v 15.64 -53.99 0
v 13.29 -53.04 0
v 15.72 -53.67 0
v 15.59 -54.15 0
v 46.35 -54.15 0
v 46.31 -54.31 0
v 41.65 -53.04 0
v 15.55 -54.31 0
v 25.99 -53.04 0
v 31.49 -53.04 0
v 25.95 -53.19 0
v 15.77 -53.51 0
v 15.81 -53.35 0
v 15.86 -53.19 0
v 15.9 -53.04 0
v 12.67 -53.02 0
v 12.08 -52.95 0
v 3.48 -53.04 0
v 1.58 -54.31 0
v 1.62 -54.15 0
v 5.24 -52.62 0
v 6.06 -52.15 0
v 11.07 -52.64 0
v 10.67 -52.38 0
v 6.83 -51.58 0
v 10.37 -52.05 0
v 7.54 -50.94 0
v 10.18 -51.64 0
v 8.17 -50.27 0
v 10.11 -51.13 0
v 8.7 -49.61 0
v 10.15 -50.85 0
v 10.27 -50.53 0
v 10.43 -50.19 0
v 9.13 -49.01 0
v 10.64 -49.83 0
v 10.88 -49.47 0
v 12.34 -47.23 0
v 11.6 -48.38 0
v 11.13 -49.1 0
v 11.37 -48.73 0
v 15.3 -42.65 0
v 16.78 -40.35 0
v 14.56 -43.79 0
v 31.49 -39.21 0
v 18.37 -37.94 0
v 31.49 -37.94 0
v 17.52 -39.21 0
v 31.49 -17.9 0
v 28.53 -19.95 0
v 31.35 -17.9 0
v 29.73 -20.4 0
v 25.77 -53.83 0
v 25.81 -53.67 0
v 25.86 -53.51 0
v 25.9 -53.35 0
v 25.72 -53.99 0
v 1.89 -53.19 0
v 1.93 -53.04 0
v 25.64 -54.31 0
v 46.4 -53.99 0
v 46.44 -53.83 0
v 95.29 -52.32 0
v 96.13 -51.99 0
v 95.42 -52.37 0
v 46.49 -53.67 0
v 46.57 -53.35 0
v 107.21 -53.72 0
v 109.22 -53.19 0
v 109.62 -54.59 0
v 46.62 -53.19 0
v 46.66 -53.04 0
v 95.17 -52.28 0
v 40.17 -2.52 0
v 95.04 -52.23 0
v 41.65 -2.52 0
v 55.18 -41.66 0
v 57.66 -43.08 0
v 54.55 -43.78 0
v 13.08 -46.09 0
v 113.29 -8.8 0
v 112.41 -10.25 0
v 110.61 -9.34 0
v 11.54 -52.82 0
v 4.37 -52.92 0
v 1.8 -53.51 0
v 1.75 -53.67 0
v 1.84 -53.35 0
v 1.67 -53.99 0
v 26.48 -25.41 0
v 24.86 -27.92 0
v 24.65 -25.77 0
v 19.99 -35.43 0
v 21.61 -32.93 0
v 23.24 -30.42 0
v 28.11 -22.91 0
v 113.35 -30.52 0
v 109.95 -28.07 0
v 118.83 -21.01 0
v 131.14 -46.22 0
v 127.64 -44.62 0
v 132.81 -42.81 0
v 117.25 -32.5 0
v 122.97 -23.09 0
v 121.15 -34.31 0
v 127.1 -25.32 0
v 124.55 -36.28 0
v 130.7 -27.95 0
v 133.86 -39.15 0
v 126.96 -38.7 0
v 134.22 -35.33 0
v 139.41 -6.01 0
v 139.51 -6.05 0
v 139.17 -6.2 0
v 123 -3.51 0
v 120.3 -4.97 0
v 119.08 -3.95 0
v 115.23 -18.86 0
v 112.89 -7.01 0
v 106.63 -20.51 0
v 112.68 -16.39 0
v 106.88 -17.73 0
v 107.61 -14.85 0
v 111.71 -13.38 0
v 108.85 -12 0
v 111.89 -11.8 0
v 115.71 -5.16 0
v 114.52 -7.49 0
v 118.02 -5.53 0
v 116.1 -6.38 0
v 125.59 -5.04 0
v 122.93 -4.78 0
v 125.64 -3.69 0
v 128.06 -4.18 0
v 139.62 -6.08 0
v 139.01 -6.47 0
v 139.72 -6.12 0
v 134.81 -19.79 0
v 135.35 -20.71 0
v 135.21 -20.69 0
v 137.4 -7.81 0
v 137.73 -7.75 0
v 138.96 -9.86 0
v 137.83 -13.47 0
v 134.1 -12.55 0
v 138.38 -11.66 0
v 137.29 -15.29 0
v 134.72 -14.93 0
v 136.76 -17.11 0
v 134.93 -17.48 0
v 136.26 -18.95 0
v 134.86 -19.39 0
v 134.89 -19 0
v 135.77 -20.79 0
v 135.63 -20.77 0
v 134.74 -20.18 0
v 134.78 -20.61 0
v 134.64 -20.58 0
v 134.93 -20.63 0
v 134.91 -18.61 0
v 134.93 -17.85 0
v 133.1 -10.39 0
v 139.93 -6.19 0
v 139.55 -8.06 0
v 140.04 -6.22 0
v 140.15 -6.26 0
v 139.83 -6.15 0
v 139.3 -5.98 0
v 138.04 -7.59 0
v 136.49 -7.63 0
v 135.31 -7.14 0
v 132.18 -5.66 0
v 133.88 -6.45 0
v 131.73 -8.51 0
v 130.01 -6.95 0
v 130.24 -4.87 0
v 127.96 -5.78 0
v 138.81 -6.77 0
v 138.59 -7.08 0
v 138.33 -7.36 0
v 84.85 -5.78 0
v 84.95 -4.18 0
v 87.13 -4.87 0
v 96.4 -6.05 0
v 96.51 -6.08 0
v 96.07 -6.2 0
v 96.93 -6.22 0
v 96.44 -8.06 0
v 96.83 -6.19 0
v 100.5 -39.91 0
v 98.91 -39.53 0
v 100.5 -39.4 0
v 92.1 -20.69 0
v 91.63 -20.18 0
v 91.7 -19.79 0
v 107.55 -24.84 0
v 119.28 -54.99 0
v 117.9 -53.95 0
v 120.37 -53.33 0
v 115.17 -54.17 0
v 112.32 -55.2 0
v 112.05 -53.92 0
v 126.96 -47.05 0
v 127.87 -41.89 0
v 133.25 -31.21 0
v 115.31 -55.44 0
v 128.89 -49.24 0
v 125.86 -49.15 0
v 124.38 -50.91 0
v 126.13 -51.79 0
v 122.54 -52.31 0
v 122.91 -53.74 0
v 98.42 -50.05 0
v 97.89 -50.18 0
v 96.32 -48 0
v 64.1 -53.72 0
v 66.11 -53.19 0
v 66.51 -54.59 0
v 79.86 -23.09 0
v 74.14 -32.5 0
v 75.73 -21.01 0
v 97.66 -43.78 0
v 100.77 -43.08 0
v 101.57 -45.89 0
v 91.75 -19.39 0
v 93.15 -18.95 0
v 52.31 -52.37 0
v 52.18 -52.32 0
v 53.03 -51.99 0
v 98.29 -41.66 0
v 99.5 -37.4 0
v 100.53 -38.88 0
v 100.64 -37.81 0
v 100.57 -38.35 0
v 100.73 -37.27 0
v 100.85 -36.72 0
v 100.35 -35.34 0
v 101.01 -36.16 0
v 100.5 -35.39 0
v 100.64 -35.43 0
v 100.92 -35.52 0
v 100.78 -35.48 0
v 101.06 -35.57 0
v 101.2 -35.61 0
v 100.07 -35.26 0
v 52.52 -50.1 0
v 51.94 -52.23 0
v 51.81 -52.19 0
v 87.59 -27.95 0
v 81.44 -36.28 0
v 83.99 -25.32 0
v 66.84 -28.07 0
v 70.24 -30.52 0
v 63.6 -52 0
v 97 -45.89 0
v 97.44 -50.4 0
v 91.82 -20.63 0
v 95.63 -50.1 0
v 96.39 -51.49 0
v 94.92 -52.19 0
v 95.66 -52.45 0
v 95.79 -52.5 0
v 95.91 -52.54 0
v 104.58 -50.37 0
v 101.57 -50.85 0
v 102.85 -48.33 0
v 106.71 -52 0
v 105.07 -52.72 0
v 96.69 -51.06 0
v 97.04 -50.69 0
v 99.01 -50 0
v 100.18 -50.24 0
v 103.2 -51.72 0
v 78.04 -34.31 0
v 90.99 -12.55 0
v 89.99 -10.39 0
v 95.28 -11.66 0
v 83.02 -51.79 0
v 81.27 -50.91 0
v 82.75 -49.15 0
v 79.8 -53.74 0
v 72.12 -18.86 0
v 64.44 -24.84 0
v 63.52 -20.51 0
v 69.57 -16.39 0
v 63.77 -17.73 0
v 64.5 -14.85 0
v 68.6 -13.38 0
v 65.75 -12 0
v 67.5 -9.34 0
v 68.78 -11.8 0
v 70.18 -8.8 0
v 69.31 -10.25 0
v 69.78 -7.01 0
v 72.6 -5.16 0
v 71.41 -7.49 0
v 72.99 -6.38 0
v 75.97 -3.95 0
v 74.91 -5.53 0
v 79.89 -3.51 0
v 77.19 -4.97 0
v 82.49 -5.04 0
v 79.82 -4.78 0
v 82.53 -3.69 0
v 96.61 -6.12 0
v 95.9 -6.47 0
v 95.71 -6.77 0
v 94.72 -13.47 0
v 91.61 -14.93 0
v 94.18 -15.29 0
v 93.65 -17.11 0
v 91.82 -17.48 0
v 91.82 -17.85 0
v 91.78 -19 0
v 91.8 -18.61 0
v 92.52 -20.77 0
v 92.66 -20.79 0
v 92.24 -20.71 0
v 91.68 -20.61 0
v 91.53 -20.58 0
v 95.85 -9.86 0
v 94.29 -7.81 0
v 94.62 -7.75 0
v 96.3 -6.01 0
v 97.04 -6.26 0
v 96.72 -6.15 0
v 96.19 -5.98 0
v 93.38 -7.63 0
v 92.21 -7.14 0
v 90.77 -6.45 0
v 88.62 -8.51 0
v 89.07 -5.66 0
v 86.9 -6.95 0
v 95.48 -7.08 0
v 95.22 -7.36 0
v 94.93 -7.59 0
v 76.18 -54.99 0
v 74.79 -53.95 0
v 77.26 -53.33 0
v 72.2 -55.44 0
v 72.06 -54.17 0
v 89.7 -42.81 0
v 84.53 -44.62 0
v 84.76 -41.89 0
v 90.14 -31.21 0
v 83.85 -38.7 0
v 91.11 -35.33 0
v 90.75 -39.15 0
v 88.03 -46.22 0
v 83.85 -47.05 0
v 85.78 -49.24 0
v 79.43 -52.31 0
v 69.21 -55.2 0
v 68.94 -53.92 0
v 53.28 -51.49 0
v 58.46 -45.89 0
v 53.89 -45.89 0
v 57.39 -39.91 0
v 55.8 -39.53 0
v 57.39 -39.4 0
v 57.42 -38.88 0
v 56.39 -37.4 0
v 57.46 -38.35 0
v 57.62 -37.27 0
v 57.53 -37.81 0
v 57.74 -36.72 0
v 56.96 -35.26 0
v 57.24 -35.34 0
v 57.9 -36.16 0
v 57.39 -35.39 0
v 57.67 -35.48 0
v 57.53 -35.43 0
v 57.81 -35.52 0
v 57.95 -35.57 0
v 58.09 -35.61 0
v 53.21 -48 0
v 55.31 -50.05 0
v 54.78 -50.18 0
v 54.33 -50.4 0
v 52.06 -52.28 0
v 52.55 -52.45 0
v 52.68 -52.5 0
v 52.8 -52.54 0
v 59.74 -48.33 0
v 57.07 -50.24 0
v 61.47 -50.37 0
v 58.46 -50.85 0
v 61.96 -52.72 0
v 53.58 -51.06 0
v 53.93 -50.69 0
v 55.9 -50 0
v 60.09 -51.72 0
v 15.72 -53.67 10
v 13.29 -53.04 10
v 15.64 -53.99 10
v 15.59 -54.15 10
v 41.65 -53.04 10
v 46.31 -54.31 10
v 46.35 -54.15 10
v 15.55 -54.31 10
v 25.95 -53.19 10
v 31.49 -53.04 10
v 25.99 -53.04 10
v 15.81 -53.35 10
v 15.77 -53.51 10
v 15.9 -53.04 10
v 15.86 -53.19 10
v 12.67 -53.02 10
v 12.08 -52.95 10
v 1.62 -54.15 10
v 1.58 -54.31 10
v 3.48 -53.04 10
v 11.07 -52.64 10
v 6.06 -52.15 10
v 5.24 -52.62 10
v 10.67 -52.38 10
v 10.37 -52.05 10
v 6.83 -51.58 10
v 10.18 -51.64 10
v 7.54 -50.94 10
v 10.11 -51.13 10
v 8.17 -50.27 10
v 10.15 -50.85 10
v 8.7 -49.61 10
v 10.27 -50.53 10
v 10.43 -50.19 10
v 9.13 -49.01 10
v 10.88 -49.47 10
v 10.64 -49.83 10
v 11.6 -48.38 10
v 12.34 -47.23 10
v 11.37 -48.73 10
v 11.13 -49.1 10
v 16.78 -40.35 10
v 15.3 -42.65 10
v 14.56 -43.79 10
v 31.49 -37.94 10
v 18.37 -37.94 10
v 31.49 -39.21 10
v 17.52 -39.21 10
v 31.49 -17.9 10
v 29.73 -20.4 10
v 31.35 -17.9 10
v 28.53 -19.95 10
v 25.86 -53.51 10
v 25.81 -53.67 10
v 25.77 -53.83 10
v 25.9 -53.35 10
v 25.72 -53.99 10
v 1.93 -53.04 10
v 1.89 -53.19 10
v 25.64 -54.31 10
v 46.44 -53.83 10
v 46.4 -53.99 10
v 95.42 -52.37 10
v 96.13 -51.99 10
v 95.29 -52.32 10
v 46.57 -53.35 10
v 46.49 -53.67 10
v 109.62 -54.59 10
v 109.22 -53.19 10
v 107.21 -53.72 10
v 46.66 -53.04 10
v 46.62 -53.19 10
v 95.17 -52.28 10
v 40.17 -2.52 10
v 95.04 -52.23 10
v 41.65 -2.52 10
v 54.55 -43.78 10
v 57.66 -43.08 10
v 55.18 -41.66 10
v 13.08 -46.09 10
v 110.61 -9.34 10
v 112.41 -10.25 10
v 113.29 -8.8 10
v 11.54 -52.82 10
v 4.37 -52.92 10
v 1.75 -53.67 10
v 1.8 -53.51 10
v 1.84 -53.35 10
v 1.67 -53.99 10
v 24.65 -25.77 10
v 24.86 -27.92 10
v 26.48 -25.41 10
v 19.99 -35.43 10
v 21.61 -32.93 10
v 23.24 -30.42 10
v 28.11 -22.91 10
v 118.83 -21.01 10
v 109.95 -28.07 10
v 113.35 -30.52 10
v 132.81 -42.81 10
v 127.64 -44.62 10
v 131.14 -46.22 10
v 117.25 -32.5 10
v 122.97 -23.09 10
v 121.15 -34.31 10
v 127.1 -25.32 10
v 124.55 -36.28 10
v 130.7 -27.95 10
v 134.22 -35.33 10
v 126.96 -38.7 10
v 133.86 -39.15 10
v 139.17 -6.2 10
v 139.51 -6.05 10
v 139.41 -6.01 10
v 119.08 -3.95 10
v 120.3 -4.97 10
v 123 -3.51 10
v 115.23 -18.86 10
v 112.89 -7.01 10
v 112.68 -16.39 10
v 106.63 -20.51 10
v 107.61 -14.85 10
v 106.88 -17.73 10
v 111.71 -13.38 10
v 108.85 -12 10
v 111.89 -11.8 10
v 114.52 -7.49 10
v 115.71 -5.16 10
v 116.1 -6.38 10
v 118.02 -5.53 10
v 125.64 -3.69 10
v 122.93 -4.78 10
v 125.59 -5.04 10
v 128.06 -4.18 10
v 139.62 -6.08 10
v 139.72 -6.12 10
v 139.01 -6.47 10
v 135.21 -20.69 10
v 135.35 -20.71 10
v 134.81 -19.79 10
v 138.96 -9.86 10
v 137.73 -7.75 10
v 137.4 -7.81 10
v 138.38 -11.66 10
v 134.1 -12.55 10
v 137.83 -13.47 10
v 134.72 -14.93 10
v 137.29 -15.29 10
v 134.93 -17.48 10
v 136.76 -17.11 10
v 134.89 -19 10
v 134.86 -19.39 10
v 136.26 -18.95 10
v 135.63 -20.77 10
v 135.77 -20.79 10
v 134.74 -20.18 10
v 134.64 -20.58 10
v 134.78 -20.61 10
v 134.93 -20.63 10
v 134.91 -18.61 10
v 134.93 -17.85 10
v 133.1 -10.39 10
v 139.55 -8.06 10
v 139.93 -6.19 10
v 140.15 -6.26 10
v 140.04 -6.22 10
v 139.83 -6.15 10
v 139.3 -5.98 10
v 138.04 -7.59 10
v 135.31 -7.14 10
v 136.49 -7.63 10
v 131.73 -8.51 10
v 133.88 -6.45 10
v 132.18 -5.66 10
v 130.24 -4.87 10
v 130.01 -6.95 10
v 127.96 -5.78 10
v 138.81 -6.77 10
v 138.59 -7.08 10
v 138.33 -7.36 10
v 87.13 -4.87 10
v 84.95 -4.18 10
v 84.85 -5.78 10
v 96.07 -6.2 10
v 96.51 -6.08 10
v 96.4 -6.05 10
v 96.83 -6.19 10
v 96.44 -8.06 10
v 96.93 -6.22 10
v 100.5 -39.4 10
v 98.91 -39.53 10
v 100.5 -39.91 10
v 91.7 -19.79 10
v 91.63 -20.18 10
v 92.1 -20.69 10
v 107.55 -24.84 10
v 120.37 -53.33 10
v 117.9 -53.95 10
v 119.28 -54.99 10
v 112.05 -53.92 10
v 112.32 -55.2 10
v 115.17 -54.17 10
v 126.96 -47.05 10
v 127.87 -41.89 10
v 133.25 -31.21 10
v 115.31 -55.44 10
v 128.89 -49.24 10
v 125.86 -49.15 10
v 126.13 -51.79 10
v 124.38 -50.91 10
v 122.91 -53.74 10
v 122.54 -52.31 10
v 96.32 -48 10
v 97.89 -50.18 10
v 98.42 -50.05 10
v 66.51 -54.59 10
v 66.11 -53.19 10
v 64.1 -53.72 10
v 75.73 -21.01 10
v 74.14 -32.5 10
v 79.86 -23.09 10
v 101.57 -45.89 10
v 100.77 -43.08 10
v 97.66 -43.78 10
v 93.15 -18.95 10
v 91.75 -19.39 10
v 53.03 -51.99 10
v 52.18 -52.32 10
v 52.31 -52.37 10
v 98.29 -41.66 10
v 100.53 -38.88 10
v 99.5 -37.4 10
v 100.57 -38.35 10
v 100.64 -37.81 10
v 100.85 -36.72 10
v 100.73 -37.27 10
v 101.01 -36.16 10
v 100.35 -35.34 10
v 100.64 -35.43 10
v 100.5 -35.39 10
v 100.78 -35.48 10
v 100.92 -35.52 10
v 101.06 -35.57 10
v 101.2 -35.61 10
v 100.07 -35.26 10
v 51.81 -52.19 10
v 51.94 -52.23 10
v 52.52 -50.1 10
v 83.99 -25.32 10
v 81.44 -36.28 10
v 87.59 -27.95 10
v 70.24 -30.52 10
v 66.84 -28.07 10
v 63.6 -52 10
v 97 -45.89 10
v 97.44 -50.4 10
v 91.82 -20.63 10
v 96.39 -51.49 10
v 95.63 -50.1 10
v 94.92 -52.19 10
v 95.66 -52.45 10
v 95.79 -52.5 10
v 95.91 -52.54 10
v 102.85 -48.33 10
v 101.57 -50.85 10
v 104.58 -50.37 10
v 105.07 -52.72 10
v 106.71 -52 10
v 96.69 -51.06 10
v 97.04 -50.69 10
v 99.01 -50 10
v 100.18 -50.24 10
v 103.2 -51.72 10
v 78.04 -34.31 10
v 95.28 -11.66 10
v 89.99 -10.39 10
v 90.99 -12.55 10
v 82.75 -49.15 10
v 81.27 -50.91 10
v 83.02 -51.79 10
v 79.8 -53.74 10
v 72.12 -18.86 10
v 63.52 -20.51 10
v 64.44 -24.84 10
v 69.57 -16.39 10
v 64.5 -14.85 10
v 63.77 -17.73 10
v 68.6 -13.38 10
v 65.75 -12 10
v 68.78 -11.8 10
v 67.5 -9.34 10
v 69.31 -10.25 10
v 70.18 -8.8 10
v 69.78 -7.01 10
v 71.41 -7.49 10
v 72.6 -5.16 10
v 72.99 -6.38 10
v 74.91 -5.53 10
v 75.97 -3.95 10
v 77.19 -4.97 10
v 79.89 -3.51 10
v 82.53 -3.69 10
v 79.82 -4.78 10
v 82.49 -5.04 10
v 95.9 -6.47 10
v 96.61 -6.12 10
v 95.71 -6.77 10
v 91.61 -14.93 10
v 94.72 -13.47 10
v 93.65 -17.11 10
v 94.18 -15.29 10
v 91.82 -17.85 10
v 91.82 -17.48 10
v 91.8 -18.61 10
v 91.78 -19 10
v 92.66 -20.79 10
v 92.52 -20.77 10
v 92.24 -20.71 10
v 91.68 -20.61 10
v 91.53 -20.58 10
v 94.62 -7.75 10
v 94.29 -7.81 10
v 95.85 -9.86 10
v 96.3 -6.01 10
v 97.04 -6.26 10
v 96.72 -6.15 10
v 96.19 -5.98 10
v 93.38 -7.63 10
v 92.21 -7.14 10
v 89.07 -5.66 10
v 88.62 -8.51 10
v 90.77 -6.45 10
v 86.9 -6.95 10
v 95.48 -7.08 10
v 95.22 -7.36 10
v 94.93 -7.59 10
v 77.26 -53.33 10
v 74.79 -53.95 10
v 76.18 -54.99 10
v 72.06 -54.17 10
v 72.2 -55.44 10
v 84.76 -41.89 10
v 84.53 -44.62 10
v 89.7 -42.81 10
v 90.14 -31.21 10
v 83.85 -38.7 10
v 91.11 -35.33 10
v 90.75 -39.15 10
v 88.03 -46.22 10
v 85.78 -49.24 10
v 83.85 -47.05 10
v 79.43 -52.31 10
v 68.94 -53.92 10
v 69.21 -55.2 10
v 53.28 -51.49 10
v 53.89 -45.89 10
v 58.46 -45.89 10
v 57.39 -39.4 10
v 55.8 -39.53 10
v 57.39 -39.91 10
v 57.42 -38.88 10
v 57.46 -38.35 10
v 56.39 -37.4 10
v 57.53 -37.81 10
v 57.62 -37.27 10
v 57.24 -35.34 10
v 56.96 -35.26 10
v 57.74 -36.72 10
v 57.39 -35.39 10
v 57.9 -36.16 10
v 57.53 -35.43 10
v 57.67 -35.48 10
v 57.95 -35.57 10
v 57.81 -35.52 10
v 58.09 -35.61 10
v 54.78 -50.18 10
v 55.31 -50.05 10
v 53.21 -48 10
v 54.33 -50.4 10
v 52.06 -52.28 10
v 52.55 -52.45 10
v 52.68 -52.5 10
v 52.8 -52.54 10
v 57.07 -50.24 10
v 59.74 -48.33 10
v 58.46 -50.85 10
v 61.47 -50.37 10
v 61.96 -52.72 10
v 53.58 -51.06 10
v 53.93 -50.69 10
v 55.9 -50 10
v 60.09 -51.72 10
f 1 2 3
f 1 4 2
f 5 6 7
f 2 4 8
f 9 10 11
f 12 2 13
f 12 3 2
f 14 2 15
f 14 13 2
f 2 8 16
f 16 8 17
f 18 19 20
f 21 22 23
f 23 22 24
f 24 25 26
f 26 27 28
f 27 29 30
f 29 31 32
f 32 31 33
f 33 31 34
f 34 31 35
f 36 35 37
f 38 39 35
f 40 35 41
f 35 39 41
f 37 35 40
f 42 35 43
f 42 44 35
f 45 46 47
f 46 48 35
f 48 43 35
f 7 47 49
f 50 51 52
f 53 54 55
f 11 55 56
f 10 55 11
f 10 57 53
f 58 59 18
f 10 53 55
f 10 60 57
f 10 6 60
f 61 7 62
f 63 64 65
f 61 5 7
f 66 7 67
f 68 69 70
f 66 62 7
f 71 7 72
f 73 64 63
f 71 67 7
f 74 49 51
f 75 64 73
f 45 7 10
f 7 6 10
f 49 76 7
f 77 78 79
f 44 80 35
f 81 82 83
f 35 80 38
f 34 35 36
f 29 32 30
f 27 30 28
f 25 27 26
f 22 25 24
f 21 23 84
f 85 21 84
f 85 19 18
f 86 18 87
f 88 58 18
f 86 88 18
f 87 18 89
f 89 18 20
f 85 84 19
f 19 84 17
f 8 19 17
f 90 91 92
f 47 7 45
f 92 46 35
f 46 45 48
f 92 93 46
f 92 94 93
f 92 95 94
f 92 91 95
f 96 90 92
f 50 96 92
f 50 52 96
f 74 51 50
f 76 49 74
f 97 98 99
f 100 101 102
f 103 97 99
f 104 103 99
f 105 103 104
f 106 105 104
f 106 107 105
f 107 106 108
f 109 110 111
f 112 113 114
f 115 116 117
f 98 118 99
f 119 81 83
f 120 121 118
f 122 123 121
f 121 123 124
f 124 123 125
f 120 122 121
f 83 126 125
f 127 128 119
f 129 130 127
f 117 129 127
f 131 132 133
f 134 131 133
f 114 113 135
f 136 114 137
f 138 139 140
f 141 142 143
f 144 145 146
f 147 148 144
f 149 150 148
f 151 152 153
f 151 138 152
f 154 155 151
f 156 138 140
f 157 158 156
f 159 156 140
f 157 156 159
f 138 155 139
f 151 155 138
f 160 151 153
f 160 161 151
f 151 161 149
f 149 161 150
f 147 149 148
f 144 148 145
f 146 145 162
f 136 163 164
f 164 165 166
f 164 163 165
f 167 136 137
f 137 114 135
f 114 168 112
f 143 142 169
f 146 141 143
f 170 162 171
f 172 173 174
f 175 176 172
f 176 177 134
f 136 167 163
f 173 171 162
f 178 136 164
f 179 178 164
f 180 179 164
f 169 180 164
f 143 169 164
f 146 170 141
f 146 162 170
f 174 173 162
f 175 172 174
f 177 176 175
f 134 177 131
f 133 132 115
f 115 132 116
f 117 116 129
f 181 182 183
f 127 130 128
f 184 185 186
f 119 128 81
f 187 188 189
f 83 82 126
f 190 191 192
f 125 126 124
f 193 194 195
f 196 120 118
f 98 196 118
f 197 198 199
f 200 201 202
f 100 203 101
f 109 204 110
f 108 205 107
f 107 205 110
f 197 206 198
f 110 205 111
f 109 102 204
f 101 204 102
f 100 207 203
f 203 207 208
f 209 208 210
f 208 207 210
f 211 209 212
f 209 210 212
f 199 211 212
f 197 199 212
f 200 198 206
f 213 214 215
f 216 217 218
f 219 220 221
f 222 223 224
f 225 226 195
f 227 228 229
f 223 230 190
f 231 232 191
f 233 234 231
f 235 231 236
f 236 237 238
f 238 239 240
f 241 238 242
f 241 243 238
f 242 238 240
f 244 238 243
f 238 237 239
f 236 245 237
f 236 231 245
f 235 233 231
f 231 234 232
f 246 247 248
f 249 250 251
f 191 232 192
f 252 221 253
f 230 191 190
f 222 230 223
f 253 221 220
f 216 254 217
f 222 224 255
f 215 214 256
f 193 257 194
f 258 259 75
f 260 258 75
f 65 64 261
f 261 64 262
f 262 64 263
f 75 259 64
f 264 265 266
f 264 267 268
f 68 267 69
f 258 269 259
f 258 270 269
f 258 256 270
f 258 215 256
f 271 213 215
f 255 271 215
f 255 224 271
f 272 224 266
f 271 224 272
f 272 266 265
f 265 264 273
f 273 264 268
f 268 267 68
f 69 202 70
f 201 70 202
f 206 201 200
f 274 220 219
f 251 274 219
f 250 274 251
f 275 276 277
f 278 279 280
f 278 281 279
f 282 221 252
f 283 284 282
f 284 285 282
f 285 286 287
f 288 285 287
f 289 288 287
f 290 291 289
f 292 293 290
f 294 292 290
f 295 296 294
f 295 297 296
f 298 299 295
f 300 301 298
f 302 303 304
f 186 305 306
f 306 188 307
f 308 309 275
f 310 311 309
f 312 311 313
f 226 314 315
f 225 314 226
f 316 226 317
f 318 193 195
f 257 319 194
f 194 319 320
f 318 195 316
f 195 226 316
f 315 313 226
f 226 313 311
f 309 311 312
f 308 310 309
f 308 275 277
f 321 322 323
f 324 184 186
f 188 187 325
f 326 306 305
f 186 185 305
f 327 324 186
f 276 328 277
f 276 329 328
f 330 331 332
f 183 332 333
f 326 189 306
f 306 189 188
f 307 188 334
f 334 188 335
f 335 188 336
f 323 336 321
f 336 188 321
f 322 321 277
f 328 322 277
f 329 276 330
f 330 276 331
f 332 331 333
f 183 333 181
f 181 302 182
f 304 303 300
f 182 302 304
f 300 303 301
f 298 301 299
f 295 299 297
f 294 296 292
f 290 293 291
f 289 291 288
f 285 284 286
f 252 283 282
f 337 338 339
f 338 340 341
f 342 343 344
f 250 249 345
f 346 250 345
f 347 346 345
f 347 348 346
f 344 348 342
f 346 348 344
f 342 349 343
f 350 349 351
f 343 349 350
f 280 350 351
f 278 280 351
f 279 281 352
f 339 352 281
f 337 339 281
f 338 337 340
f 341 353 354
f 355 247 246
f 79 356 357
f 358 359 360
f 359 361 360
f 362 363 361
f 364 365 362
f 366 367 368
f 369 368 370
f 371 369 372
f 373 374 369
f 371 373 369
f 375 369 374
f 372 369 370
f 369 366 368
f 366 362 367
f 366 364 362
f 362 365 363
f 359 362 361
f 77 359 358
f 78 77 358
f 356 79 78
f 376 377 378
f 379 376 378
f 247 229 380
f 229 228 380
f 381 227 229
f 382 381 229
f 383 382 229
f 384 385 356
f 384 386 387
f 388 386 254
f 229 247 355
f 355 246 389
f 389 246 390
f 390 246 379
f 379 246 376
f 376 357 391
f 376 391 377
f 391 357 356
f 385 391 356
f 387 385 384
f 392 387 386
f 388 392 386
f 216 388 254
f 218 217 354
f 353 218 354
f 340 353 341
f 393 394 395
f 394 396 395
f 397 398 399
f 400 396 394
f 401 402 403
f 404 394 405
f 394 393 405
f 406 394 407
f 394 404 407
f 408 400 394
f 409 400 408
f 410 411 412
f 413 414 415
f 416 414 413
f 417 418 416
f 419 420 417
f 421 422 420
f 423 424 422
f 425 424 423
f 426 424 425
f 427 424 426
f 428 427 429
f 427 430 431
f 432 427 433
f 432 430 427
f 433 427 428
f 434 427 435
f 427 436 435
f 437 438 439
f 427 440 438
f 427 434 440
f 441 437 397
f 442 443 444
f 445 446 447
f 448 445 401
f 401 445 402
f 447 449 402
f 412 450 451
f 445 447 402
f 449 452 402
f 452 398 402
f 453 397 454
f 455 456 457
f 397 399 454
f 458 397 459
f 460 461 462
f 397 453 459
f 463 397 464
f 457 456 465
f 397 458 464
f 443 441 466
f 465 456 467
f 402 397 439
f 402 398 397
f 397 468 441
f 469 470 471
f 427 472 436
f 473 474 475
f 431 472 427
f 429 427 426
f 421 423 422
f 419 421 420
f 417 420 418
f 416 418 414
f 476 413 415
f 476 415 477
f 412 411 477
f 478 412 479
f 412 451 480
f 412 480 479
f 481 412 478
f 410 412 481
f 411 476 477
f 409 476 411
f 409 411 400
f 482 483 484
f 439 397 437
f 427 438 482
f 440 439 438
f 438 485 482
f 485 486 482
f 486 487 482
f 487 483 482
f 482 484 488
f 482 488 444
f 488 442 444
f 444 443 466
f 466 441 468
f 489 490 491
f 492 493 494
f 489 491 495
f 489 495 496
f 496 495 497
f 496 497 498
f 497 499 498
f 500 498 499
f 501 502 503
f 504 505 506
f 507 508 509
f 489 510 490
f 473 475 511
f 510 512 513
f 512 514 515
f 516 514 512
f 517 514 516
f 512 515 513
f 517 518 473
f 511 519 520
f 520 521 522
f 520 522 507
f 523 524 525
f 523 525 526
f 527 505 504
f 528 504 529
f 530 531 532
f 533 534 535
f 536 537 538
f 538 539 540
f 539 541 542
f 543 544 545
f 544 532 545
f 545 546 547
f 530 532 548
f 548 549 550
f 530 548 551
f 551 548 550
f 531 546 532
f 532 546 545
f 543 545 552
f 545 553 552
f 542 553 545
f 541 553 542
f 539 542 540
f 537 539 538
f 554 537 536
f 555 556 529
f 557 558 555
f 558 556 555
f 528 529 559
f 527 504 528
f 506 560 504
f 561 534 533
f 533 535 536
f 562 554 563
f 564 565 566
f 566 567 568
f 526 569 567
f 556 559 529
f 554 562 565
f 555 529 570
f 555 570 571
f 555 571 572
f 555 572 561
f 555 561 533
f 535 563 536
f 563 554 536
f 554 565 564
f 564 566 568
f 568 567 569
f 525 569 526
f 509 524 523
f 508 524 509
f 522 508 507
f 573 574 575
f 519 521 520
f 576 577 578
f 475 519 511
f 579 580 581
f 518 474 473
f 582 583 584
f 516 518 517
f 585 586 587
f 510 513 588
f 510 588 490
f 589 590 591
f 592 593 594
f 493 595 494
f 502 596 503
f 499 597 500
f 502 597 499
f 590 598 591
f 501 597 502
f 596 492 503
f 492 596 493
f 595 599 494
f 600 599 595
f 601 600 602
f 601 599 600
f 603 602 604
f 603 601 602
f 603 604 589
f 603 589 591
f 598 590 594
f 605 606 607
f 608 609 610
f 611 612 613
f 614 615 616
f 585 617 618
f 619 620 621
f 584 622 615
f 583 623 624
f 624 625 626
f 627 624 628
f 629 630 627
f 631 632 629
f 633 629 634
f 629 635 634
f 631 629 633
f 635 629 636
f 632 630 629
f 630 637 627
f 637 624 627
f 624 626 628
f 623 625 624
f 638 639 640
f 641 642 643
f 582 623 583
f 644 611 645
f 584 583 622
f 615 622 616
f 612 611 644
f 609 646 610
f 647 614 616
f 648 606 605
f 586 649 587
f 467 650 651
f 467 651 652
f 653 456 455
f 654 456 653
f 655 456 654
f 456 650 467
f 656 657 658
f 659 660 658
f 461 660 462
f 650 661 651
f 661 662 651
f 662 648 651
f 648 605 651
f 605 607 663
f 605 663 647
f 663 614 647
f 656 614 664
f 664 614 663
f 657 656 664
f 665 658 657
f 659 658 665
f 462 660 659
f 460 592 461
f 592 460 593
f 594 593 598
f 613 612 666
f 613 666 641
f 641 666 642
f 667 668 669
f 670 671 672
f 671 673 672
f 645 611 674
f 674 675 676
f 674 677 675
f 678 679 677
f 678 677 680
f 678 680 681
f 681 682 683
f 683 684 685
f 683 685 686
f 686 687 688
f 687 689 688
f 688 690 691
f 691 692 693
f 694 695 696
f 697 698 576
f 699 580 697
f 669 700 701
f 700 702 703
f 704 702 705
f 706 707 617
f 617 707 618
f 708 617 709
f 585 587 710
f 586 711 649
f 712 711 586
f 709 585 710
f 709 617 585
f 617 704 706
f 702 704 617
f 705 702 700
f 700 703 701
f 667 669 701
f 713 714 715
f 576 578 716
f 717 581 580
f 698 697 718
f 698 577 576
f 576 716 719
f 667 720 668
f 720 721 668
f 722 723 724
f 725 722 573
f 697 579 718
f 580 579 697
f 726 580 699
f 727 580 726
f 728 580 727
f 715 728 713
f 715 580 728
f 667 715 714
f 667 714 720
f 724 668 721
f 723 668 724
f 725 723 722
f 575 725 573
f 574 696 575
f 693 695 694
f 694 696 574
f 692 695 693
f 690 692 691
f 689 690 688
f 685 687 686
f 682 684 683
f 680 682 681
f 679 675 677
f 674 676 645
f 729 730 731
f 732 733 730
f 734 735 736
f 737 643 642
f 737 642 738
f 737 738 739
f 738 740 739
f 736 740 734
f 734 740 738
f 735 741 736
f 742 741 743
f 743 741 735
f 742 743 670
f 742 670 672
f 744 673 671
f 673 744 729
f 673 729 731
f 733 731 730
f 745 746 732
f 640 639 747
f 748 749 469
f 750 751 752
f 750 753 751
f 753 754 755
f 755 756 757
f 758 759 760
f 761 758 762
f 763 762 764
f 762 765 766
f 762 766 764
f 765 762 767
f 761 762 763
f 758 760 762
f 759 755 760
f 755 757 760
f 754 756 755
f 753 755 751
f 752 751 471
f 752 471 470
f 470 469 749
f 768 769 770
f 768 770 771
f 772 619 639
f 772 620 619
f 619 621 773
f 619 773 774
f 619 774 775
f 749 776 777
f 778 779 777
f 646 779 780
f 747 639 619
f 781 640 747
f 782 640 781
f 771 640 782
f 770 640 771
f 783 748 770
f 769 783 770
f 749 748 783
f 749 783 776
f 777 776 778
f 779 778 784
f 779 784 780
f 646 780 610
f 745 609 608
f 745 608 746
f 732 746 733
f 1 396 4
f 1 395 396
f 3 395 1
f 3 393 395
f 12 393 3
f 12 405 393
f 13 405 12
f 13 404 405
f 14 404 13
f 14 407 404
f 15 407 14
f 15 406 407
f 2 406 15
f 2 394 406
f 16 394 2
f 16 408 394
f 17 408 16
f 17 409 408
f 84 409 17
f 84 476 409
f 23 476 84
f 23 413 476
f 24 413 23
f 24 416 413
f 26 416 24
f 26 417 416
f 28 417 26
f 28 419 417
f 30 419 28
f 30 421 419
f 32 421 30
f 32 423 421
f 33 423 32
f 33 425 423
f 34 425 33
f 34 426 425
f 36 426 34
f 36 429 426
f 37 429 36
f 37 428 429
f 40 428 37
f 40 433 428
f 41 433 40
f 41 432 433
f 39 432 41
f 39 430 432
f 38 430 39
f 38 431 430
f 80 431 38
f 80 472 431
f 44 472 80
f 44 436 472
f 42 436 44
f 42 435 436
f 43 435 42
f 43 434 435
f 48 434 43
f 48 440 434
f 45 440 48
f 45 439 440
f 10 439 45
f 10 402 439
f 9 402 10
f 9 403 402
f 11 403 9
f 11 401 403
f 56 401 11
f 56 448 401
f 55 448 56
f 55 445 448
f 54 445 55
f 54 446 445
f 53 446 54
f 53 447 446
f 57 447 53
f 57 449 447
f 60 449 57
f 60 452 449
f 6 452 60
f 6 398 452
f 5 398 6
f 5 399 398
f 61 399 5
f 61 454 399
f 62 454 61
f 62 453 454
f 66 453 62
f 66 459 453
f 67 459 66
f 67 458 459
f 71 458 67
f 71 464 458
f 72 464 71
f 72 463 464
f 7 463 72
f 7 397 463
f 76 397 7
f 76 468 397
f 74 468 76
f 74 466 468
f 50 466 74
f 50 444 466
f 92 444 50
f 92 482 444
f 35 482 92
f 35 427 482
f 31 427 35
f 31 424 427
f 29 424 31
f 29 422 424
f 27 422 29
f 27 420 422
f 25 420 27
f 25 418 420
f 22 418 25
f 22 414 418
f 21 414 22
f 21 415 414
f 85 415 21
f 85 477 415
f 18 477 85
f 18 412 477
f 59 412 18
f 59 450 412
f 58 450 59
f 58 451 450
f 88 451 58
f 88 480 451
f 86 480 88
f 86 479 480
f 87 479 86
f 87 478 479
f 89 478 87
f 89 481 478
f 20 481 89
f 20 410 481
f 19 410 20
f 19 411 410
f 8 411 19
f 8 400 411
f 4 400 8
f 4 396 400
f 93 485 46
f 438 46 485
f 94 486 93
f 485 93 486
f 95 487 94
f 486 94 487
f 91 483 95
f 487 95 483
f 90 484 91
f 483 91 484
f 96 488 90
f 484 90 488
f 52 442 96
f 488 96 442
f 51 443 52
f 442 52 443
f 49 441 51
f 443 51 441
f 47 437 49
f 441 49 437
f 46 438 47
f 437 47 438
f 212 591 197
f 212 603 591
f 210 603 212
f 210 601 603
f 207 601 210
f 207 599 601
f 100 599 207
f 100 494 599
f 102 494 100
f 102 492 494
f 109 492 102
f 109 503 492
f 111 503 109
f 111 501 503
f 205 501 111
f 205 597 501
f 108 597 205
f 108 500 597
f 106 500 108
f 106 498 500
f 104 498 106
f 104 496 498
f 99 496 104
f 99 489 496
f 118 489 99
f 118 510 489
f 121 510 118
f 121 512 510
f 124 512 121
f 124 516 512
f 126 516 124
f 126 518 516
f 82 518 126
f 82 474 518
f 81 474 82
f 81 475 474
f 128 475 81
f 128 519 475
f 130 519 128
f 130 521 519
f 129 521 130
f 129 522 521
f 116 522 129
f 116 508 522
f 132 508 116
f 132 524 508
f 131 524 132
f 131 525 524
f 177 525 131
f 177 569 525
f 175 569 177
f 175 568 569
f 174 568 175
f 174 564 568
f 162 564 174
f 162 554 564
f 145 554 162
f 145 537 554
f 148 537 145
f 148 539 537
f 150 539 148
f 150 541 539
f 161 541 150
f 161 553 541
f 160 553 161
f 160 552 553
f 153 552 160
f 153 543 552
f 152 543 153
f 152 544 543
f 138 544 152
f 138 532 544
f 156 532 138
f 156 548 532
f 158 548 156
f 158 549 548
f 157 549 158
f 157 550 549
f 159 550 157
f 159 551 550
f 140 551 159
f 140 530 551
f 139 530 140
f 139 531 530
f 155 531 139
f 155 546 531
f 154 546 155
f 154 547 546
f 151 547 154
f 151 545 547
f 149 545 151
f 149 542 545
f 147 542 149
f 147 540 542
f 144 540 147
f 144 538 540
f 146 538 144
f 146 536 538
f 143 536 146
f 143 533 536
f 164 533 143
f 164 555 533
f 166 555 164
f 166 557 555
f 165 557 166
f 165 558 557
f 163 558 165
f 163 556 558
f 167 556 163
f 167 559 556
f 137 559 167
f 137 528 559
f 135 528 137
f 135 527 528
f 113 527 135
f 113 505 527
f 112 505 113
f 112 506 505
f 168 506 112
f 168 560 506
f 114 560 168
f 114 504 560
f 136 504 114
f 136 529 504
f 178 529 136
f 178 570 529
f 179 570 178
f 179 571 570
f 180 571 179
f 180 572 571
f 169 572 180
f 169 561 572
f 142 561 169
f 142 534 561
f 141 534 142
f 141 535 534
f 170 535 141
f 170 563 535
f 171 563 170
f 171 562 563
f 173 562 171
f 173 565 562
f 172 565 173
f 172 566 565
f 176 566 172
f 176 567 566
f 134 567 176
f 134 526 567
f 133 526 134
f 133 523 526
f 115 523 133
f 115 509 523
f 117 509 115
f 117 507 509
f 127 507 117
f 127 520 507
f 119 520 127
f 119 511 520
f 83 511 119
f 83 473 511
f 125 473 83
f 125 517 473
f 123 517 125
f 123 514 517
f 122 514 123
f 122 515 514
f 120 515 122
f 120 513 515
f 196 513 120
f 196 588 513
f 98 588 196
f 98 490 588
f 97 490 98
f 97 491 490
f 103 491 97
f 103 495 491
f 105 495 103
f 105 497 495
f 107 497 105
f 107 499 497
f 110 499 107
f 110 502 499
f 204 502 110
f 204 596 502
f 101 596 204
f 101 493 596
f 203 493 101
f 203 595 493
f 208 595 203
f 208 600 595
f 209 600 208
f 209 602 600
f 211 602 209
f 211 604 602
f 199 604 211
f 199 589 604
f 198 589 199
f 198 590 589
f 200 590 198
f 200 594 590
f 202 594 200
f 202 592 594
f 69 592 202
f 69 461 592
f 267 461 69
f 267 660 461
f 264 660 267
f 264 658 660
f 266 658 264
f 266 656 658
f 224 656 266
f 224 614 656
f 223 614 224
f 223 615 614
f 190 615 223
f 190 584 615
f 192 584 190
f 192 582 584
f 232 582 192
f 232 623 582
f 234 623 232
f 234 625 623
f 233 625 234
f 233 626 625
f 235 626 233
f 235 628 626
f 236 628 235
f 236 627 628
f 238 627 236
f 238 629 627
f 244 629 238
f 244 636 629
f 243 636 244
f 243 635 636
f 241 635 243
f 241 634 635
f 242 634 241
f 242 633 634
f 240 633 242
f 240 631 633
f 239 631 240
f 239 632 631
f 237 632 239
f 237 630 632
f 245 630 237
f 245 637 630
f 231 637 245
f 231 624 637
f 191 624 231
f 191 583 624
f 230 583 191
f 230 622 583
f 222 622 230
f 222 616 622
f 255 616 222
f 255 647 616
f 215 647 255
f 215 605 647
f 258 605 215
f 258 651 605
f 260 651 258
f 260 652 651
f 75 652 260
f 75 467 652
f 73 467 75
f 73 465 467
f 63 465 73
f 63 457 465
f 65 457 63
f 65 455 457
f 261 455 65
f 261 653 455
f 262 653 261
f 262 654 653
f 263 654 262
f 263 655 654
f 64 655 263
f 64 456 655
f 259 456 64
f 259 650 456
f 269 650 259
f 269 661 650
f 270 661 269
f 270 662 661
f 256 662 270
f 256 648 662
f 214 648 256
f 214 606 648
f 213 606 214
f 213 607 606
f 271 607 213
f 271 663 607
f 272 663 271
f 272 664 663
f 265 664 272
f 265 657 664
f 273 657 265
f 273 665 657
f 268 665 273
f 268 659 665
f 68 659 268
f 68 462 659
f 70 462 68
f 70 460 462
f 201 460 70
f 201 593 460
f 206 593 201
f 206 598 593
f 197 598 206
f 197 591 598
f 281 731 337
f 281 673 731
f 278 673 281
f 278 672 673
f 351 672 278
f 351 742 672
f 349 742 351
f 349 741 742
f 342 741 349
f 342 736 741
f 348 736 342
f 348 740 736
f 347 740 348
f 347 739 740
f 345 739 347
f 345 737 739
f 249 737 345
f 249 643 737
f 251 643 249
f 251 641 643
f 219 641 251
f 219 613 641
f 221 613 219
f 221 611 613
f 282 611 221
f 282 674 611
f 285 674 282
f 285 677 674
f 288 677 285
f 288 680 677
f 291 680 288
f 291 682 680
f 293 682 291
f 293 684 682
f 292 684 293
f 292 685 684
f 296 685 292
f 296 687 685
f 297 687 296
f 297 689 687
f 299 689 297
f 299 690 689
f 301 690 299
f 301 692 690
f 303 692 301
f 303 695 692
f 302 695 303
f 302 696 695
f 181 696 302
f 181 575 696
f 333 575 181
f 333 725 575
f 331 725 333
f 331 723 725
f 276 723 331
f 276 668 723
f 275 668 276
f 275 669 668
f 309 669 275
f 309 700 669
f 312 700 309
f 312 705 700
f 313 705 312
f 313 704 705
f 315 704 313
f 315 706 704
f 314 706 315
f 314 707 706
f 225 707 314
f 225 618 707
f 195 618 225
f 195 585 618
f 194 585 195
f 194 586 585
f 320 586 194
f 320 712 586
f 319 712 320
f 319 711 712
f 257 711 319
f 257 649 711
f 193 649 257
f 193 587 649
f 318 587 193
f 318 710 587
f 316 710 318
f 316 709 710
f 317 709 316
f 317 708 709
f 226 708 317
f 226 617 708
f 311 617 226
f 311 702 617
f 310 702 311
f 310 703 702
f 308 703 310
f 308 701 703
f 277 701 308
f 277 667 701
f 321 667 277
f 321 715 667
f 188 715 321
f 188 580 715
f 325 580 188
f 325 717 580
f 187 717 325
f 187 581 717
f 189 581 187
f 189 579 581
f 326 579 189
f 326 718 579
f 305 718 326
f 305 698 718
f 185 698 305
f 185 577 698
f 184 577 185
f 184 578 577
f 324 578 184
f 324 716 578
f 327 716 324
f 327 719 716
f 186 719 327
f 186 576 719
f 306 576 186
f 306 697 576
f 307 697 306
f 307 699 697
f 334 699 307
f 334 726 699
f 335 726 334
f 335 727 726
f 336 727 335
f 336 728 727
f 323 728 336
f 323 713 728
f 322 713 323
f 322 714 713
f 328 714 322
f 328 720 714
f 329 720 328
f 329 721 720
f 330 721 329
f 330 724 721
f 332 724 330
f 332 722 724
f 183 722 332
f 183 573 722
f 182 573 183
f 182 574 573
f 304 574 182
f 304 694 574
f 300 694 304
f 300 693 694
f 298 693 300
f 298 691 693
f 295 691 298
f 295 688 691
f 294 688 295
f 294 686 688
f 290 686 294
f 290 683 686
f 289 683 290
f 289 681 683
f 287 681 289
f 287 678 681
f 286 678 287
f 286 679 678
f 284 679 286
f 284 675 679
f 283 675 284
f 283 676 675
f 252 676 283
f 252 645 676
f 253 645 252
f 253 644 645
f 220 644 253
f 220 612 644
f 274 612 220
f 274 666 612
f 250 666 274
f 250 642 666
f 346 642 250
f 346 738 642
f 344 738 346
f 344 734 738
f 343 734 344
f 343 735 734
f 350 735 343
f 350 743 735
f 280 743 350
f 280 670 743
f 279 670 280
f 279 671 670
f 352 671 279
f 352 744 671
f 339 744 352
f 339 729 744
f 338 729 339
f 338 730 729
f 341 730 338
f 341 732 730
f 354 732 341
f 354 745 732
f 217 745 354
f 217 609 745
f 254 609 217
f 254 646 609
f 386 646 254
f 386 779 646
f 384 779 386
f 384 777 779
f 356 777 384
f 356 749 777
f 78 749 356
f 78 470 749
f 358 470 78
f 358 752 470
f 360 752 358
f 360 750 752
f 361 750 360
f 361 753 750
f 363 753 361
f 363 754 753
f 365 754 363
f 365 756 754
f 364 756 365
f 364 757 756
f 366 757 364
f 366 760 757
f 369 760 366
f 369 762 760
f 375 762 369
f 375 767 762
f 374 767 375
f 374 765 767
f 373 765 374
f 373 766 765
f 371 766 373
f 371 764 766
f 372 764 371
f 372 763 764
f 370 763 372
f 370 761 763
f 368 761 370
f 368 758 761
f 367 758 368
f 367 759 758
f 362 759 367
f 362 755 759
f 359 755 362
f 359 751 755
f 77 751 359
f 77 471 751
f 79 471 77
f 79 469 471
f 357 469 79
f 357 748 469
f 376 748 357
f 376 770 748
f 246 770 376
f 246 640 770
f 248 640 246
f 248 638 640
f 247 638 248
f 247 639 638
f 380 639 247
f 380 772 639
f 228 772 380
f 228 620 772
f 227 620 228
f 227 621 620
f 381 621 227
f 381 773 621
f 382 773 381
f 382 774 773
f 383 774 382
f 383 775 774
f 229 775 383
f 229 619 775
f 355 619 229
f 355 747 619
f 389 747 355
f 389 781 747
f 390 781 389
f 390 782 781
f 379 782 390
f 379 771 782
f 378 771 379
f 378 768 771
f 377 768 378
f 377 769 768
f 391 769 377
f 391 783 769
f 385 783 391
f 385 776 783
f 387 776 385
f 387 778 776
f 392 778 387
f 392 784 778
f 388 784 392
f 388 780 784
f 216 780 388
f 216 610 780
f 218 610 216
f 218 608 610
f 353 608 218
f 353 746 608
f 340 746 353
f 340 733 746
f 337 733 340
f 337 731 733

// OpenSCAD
linear_extrude(height = 10, center = false) {

polygon(points=[[101.2,-35.61],[101.01,-36.16],[100.85,-36.72],[100.73,-37.27],[100.64,-37.81],[100.57,-38.35],[100.53,-38.88],[100.5,-39.4],[100.5,-39.91],[100.77,-43.08],[101.57,-45.89],[102.85,-48.33],[104.58,-50.37],[106.71,-52],[109.22,-53.19],[112.05,-53.92],[115.17,-54.17],[117.9,-53.95],[120.37,-53.33],[122.54,-52.31],[124.38,-50.91],[125.86,-49.15],[126.96,-47.05],[127.64,-44.62],[127.87,-41.89],[126.96,-38.7],[124.55,-36.28],[121.15,-34.31],[117.25,-32.5],[113.35,-30.52],[109.95,-28.07],[107.55,-24.84],[106.63,-20.51],[106.88,-17.73],[107.61,-14.85],[108.85,-12],[110.61,-9.34],[112.89,-7.01],[115.71,-5.16],[119.08,-3.95],[123,-3.51],[125.64,-3.69],[128.06,-4.18],[130.24,-4.87],[132.18,-5.66],[133.88,-6.45],[135.31,-7.14],[136.49,-7.63],[137.4,-7.81],[137.73,-7.75],[138.04,-7.59],[138.33,-7.36],[138.59,-7.08],[138.81,-6.77],[139.01,-6.47],[139.17,-6.2],[139.3,-5.98],[139.41,-6.01],[139.51,-6.05],[139.62,-6.08],[139.72,-6.12],[139.83,-6.15],[139.93,-6.19],[140.04,-6.22],[140.15,-6.26],[139.55,-8.06],[138.96,-9.86],[138.38,-11.66],[137.83,-13.47],[137.29,-15.29],[136.76,-17.11],[136.26,-18.95],[135.77,-20.79],[135.63,-20.77],[135.49,-20.74],[135.35,-20.71],[135.21,-20.69],[135.07,-20.66],[134.93,-20.63],[134.78,-20.61],[134.64,-20.58],[134.74,-20.18],[134.81,-19.79],[134.86,-19.39],[134.89,-19],[134.91,-18.61],[134.92,-18.23],[134.93,-17.85],[134.93,-17.48],[134.72,-14.93],[134.1,-12.55],[133.1,-10.39],[131.73,-8.51],[130.01,-6.95],[127.96,-5.78],[125.59,-5.04],[122.93,-4.78],[120.3,-4.97],[118.02,-5.53],[116.1,-6.38],[114.52,-7.49],[113.29,-8.8],[112.41,-10.25],[111.89,-11.8],[111.71,-13.38],[112.68,-16.39],[115.23,-18.86],[118.83,-21.01],[122.97,-23.09],[127.1,-25.32],[130.7,-27.95],[133.25,-31.21],[134.22,-35.33],[133.86,-39.15],[132.81,-42.81],[131.14,-46.22],[128.89,-49.24],[126.13,-51.79],[122.91,-53.74],[119.28,-54.99],[115.31,-55.44],[112.32,-55.2],[109.62,-54.59],[107.21,-53.72],[105.07,-52.72],[103.2,-51.72],[101.57,-50.85],[100.18,-50.24],[99.01,-50],[98.42,-50.05],[97.89,-50.18],[97.44,-50.4],[97.04,-50.69],[96.69,-51.06],[96.39,-51.49],[96.13,-51.99],[95.91,-52.54],[95.79,-52.5],[95.66,-52.45],[95.54,-52.41],[95.42,-52.37],[95.29,-52.32],[95.17,-52.28],[95.04,-52.23],[94.92,-52.19],[95.63,-50.1],[96.32,-48],[97,-45.89],[97.66,-43.78],[98.29,-41.66],[98.91,-39.53],[99.5,-37.4],[100.07,-35.26],[100.21,-35.3],[100.35,-35.34],[100.5,-35.39],[100.64,-35.43],[100.78,-35.48],[100.92,-35.52],[101.06,-35.57],[101.2,-35.61]], paths=[[0,1,2,3,4,5,6,7,8,9,10,11,12,13,14,15,16,17,18,19,20,21,22,23,24,25,26,27,28,29,30,31,32,33,34,35,36,37,38,39,40,41,42,43,44,45,46,47,48,49,50,51,52,53,54,55,56,57,58,59,60,61,62,63,64,65,66,67,68,69,70,71,72,73,74,75,76,77,78,79,80,81,82,83,84,85,86,87,88,89,90,91,92,93,94,95,96,97,98,99,100,101,102,103,104,105,106,107,108,109,110,111,112,113,114,115,116,117,118,119,120,121,122,123,124,125,126,127,128,129,130,131,132,133,134,135,136,137,138,139,140,141,142,143,144,145,146,147,148,149,150,151,152,153,154,155,156,157,158,159,160]]);
polygon(points=[[58.09,-35.61],[57.9,-36.16],[57.74,-36.72],[57.62,-37.27],[57.53,-37.81],[57.46,-38.35],[57.42,-38.88],[57.39,-39.4],[57.39,-39.91],[57.66,-43.08],[58.46,-45.89],[59.74,-48.33],[61.47,-50.37],[63.6,-52],[66.11,-53.19],[68.94,-53.92],[72.06,-54.17],[74.79,-53.95],[77.26,-53.33],[79.43,-52.31],[81.27,-50.91],[82.75,-49.15],[83.85,-47.05],[84.53,-44.62],[84.76,-41.89],[83.85,-38.7],[81.44,-36.28],[78.04,-34.31],[74.14,-32.5],[70.24,-30.52],[66.84,-28.07],[64.44,-24.84],[63.52,-20.51],[63.77,-17.73],[64.5,-14.85],[65.75,-12],[67.5,-9.34],[69.78,-7.01],[72.6,-5.16],[75.97,-3.95],[79.89,-3.51],[82.53,-3.69],[84.95,-4.18],[87.13,-4.87],[89.07,-5.66],[90.77,-6.45],[92.21,-7.14],[93.38,-7.63],[94.29,-7.81],[94.62,-7.75],[94.93,-7.59],[95.22,-7.36],[95.48,-7.08],[95.71,-6.77],[95.9,-6.47],[96.07,-6.2],[96.19,-5.98],[96.3,-6.01],[96.4,-6.05],[96.51,-6.08],[96.61,-6.12],[96.72,-6.15],[96.83,-6.19],[96.93,-6.22],[97.04,-6.26],[96.44,-8.06],[95.85,-9.86],[95.28,-11.66],[94.72,-13.47],[94.18,-15.29],[93.65,-17.11],[93.15,-18.95],[92.66,-20.79],[92.52,-20.77],[92.38,-20.74],[92.24,-20.71],[92.1,-20.69],[91.96,-20.66],[91.82,-20.63],[91.68,-20.61],[91.53,-20.58],[91.63,-20.18],[91.7,-19.79],[91.75,-19.39],[91.78,-19],[91.8,-18.61],[91.81,-18.23],[91.82,-17.85],[91.82,-17.48],[91.61,-14.93],[90.99,-12.55],[89.99,-10.39],[88.62,-8.51],[86.9,-6.95],[84.85,-5.78],[82.49,-5.04],[79.82,-4.78],[77.19,-4.97],[74.91,-5.53],[72.99,-6.38],[71.41,-7.49],[70.18,-8.8],[69.31,-10.25],[68.78,-11.8],[68.6,-13.38],[69.57,-16.39],[72.12,-18.86],[75.73,-21.01],[79.86,-23.09],[83.99,-25.32],[87.59,-27.95],[90.14,-31.21],[91.11,-35.33],[90.75,-39.15],[89.7,-42.81],[88.03,-46.22],[85.78,-49.24],[83.02,-51.79],[79.8,-53.74],[76.18,-54.99],[72.2,-55.44],[69.21,-55.2],[66.51,-54.59],[64.1,-53.72],[61.96,-52.72],[60.09,-51.72],[58.46,-50.85],[57.07,-50.24],[55.9,-50],[55.31,-50.05],[54.78,-50.18],[54.33,-50.4],[53.93,-50.69],[53.58,-51.06],[53.28,-51.49],[53.03,-51.99],[52.8,-52.54],[52.68,-52.5],[52.55,-52.45],[52.43,-52.41],[52.31,-52.37],[52.18,-52.32],[52.06,-52.28],[51.94,-52.23],[51.81,-52.19],[52.52,-50.1],[53.21,-48],[53.89,-45.89],[54.55,-43.78],[55.18,-41.66],[55.8,-39.53],[56.39,-37.4],[56.96,-35.26],[57.1,-35.3],[57.24,-35.34],[57.39,-35.39],[57.53,-35.43],[57.67,-35.48],[57.81,-35.52],[57.95,-35.57],[58.09,-35.61]], paths=[[0,1,2,3,4,5,6,7,8,9,10,11,12,13,14,15,16,17,18,19,20,21,22,23,24,25,26,27,28,29,30,31,32,33,34,35,36,37,38,39,40,41,42,43,44,45,46,47,48,49,50,51,52,53,54,55,56,57,58,59,60,61,62,63,64,65,66,67,68,69,70,71,72,73,74,75,76,77,78,79,80,81,82,83,84,85,86,87,88,89,90,91,92,93,94,95,96,97,98,99,100,101,102,103,104,105,106,107,108,109,110,111,112,113,114,115,116,117,118,119,120,121,122,123,124,125,126,127,128,129,130,131,132,133,134,135,136,137,138,139,140,141,142,143,144,145,146,147,148,149,150,151,152,153,154,155,156,157,158,159,160]]);
polygon(points=[[31.49,-17.9],[31.47,-17.9],[31.46,-17.9],[31.44,-17.9],[31.42,-17.9],[31.4,-17.9],[31.39,-17.9],[31.37,-17.9],[31.35,-17.9],[29.73,-20.4],[28.11,-22.91],[26.48,-25.41],[24.86,-27.92],[23.24,-30.42],[21.61,-32.93],[19.99,-35.43],[18.37,-37.94],[20.01,-37.94],[21.65,-37.94],[23.29,-37.94],[24.93,-37.94],[26.57,-37.94],[28.21,-37.94],[29.85,-37.94],[31.49,-37.94],[31.49,-35.43],[31.49,-32.93],[31.49,-30.42],[31.49,-27.92],[31.49,-25.41],[31.49,-22.91],[31.49,-20.4],[31.49,-17.9],[1.93,-53.04],[2.12,-53.04],[2.32,-53.04],[2.51,-53.04],[2.71,-53.04],[2.9,-53.04],[3.09,-53.04],[3.29,-53.04],[3.48,-53.04],[4.37,-52.92],[5.24,-52.62],[6.06,-52.15],[6.83,-51.58],[7.54,-50.94],[8.17,-50.27],[8.7,-49.61],[9.13,-49.01],[13.01,-43.2],[16.89,-37.39],[20.77,-31.58],[24.65,-25.77],[28.53,-19.95],[32.41,-14.14],[36.29,-8.33],[40.17,-2.52],[40.36,-2.52],[40.54,-2.52],[40.73,-2.52],[40.91,-2.52],[41.1,-2.52],[41.28,-2.52],[41.47,-2.52],[41.65,-2.52],[41.65,-8.83],[41.65,-15.15],[41.65,-21.46],[41.65,-27.78],[41.65,-34.09],[41.65,-40.41],[41.65,-46.72],[41.65,-53.04],[42.28,-53.04],[42.9,-53.04],[43.53,-53.04],[44.16,-53.04],[44.78,-53.04],[45.41,-53.04],[46.04,-53.04],[46.66,-53.04],[46.62,-53.19],[46.57,-53.35],[46.53,-53.51],[46.49,-53.67],[46.44,-53.83],[46.4,-53.99],[46.35,-54.15],[46.31,-54.31],[43.72,-54.31],[41.14,-54.31],[38.56,-54.31],[35.97,-54.31],[33.39,-54.31],[30.8,-54.31],[28.22,-54.31],[25.64,-54.31],[25.68,-54.15],[25.72,-53.99],[25.77,-53.83],[25.81,-53.67],[25.86,-53.51],[25.9,-53.35],[25.95,-53.19],[25.99,-53.04],[26.68,-53.04],[27.36,-53.04],[28.05,-53.04],[28.74,-53.04],[29.43,-53.04],[30.12,-53.04],[30.8,-53.04],[31.49,-53.04],[31.49,-51.31],[31.49,-49.58],[31.49,-47.85],[31.49,-46.12],[31.49,-44.39],[31.49,-42.66],[31.49,-40.94],[31.49,-39.21],[29.75,-39.21],[28,-39.21],[26.25,-39.21],[24.51,-39.21],[22.76,-39.21],[21.02,-39.21],[19.27,-39.21],[17.52,-39.21],[16.78,-40.35],[16.04,-41.5],[15.3,-42.65],[14.56,-43.79],[13.82,-44.94],[13.08,-46.09],[12.34,-47.23],[11.6,-48.38],[11.37,-48.73],[11.13,-49.1],[10.88,-49.47],[10.64,-49.83],[10.43,-50.19],[10.27,-50.53],[10.15,-50.85],[10.11,-51.13],[10.18,-51.64],[10.37,-52.05],[10.67,-52.38],[11.07,-52.64],[11.54,-52.82],[12.08,-52.95],[12.67,-53.02],[13.29,-53.04],[13.62,-53.04],[13.94,-53.04],[14.27,-53.04],[14.59,-53.04],[14.92,-53.04],[15.25,-53.04],[15.57,-53.04],[15.9,-53.04],[15.86,-53.19],[15.81,-53.35],[15.77,-53.51],[15.72,-53.67],[15.68,-53.83],[15.64,-53.99],[15.59,-54.15],[15.55,-54.31],[13.8,-54.31],[12.05,-54.31],[10.31,-54.31],[8.56,-54.31],[6.82,-54.31],[5.07,-54.31],[3.32,-54.31],[1.58,-54.31],[1.62,-54.15],[1.67,-53.99],[1.71,-53.83],[1.75,-53.67],[1.8,-53.51],[1.84,-53.35],[1.89,-53.19],[1.93,-53.04]], paths=[[0,1,2,3,4,5,6,7,8,9,10,11,12,13,14,15,16,17,18,19,20,21,22,23,24,25,26,27,28,29,30,31,32],[33,34,35,36,37,38,39,40,41,42,43,44,45,46,47,48,49,50,51,52,53,54,55,56,57,58,59,60,61,62,63,64,65,66,67,68,69,70,71,72,73,74,75,76,77,78,79,80,81,82,83,84,85,86,87,88,89,90,91,92,93,94,95,96,97,98,99,100,101,102,103,104,105,106,107,108,109,110,111,112,113,114,115,116,117,118,119,120,121,122,123,124,125,126,127,128,129,130,131,132,133,134,135,136,137,138,139,140,141,142,143,144,145,146,147,148,149,150,151,152,153,154,155,156,157,158,159,160,161,162,163,164,165,166,167,168,169,170,171,172,173,174,175,176,177,178,179,180,181,182,183,184,185]]);

}
